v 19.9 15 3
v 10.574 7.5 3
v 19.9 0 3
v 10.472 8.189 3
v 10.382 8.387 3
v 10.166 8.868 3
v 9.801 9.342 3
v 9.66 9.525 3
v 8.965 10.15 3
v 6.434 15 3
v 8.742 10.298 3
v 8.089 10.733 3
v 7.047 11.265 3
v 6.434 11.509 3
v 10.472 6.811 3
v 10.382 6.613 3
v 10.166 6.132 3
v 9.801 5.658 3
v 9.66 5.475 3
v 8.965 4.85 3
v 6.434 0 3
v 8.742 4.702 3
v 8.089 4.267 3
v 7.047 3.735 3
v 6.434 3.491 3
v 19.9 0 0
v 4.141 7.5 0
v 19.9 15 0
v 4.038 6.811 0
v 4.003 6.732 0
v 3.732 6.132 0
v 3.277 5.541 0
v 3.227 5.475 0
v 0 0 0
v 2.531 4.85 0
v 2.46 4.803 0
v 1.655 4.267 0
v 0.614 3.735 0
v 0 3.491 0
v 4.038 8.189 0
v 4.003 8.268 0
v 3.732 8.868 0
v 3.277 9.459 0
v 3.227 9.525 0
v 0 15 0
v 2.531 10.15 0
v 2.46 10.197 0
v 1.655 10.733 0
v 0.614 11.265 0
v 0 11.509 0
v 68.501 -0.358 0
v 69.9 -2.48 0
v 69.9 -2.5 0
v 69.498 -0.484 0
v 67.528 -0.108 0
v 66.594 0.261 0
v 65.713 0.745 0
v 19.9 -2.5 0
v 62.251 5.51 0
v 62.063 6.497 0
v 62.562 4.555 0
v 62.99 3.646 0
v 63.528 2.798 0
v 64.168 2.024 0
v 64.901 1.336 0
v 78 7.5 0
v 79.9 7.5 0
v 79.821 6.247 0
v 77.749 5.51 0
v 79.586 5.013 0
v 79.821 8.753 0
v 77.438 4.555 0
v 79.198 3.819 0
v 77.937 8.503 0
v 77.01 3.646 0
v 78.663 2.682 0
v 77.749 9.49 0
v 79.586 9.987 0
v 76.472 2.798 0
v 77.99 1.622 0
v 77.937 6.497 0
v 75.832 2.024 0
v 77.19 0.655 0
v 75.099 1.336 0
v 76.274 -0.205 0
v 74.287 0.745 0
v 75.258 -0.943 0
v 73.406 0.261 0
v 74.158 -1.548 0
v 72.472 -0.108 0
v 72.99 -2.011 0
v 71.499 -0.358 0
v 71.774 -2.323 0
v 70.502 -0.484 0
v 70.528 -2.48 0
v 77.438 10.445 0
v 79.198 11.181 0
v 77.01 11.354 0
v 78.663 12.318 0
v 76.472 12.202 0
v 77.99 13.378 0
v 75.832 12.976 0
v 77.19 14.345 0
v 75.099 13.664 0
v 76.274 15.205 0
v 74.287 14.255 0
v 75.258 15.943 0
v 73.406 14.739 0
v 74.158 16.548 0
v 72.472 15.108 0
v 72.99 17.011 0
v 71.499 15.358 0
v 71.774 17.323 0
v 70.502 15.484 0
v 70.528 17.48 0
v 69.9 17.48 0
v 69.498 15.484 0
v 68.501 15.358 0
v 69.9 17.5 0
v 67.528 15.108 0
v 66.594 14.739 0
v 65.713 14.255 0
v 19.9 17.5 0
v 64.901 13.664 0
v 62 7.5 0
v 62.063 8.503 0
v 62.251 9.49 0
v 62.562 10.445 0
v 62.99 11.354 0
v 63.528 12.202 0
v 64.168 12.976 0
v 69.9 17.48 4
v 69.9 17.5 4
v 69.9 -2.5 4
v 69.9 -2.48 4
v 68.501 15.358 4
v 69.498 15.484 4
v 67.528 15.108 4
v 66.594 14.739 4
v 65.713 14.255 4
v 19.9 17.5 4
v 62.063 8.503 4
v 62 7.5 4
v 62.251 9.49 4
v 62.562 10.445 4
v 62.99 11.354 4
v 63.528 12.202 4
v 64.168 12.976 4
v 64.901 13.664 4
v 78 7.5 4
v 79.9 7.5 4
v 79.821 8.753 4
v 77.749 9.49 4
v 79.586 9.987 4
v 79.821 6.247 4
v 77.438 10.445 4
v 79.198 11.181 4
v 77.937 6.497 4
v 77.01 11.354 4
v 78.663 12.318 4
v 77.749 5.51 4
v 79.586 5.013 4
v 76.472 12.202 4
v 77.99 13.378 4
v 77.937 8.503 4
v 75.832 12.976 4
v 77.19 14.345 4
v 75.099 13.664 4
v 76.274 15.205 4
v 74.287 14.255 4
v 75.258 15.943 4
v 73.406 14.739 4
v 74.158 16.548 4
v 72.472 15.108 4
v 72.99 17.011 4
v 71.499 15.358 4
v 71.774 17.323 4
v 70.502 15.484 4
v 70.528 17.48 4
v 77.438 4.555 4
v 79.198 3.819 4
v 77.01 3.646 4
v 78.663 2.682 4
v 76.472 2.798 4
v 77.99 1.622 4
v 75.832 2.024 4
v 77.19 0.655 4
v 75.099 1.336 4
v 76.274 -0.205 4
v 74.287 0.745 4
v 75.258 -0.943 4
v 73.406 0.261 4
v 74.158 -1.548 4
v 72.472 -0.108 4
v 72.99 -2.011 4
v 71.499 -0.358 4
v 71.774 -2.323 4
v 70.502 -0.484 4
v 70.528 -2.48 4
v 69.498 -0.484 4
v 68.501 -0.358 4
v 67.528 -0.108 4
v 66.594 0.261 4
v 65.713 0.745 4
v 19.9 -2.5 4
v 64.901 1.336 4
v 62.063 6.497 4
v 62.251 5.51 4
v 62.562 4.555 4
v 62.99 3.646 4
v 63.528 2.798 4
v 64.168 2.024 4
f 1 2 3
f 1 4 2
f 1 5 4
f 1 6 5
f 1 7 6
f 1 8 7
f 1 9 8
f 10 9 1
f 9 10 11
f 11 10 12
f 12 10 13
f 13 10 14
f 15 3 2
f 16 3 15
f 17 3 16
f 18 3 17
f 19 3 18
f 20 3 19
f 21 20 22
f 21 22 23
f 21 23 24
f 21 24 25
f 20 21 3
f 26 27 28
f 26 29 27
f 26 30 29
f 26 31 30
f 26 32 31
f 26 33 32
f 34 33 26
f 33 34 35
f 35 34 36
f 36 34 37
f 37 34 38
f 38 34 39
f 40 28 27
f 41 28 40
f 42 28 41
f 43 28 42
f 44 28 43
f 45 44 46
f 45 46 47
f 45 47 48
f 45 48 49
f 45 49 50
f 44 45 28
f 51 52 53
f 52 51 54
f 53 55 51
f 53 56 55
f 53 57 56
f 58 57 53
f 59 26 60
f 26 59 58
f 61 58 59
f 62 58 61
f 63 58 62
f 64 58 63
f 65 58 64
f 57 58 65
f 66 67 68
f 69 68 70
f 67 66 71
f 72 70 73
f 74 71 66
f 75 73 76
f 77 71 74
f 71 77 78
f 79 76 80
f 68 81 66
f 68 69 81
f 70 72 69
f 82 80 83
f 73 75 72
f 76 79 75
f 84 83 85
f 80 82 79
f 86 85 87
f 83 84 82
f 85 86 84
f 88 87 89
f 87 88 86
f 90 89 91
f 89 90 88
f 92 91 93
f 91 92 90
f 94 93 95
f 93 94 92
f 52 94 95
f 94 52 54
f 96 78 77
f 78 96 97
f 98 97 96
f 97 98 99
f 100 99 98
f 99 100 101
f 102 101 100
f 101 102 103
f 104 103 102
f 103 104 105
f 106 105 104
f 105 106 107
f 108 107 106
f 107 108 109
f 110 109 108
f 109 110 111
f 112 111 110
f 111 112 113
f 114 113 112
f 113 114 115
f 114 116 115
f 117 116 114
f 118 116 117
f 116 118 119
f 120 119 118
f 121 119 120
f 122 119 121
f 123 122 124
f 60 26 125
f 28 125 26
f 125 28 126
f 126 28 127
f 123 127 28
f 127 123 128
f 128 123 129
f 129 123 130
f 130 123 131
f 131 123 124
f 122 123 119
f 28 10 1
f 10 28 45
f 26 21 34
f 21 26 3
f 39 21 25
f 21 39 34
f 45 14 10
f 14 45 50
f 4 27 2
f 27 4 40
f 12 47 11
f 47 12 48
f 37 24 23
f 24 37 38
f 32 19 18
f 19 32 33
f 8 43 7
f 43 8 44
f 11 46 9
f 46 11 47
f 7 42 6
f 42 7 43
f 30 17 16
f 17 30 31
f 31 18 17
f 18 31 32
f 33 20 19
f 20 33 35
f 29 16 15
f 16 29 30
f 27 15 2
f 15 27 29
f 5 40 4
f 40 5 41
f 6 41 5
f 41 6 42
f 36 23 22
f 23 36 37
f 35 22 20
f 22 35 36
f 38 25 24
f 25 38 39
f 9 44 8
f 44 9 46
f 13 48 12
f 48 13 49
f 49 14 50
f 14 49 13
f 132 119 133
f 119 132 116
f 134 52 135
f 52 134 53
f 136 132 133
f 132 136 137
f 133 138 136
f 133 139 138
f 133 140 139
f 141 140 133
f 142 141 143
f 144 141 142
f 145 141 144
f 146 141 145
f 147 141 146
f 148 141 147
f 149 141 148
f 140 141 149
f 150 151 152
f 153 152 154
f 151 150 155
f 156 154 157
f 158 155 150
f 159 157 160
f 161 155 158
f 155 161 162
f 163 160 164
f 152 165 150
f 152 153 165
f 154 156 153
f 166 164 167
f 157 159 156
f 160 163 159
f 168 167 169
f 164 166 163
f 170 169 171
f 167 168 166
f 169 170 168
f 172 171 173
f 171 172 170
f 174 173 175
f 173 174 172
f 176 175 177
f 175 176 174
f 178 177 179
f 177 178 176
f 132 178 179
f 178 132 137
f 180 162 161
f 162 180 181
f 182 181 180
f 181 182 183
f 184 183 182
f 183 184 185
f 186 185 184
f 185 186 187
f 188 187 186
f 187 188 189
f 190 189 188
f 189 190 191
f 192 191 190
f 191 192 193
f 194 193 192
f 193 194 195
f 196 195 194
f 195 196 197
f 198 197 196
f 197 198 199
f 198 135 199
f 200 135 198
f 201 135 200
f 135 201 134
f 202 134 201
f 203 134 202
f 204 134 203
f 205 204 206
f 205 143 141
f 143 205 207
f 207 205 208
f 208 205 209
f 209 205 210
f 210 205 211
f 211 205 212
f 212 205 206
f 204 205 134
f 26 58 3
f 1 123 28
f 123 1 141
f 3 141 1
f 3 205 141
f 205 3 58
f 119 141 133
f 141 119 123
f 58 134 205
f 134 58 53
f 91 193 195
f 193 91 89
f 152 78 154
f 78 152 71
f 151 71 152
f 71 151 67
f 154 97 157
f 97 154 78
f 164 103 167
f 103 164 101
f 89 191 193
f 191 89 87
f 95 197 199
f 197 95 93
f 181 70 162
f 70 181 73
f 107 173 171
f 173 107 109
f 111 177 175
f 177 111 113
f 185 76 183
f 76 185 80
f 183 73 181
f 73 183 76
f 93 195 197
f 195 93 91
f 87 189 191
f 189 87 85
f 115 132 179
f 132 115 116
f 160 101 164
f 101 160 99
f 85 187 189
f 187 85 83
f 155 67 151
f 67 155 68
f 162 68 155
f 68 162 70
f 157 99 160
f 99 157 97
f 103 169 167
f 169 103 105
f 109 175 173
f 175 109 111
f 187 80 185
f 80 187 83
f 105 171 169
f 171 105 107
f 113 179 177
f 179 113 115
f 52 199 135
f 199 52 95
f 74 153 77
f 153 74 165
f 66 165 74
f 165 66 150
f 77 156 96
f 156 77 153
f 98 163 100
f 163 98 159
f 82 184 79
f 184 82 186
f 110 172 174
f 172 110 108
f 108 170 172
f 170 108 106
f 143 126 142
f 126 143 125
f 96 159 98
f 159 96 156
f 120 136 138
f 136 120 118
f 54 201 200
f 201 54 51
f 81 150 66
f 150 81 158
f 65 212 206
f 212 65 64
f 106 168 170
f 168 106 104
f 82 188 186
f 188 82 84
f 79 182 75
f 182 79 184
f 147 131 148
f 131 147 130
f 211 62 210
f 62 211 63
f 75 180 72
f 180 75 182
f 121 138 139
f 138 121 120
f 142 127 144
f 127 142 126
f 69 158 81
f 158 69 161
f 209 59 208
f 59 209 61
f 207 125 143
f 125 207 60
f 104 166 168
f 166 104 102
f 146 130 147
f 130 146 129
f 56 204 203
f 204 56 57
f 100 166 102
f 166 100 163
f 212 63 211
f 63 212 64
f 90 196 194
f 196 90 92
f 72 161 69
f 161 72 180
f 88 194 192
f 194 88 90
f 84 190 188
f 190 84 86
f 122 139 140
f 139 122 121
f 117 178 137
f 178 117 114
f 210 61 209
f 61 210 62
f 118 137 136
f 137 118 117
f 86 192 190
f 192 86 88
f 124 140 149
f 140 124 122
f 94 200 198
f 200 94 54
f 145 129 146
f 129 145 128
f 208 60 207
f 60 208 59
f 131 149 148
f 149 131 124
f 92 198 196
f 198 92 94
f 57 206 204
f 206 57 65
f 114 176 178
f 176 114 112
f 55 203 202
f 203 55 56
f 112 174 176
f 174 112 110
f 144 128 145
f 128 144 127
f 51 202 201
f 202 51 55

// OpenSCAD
handleL=50;
handleW=20;
handleH=4;
spadeL=20;
spadeW=15;
spadeH=3;
tineW=2;
tineAngle=25;
keyringT=2;

difference(){
union(){
difference(){

	cube([spadeL,spadeW,spadeH]);
	//translate([0,spadeW/2,-1])
	//	cylinder(r=spadeW/2-tineW,h=spadeH+2,$fn=50);
	rotate([0,-tineAngle,0])
		translate([0,-1,0])
			cube([spadeL,spadeW+2,spadeH*2]);
	rotate([0,90-tineAngle,0])
	translate([-spadeW/4,spadeW/2,-1])
		cylinder(r=spadeW/2-tineW,h=spadeL*2,$fn=50);
}
translate([spadeL-0.1,(spadeW-handleW)/2,0]){
	cube([handleL,handleW,handleH]);
	translate([handleL,handleW/2,0])
		cylinder(r=handleW/2,h=handleH,$fn=50);
}
}
translate([spadeL+handleL,handleW/2-(handleW-spadeW)/2,-1])
	cylinder(r=handleW/2-keyringT,h=handleH+2,$fn=50);
}
	



